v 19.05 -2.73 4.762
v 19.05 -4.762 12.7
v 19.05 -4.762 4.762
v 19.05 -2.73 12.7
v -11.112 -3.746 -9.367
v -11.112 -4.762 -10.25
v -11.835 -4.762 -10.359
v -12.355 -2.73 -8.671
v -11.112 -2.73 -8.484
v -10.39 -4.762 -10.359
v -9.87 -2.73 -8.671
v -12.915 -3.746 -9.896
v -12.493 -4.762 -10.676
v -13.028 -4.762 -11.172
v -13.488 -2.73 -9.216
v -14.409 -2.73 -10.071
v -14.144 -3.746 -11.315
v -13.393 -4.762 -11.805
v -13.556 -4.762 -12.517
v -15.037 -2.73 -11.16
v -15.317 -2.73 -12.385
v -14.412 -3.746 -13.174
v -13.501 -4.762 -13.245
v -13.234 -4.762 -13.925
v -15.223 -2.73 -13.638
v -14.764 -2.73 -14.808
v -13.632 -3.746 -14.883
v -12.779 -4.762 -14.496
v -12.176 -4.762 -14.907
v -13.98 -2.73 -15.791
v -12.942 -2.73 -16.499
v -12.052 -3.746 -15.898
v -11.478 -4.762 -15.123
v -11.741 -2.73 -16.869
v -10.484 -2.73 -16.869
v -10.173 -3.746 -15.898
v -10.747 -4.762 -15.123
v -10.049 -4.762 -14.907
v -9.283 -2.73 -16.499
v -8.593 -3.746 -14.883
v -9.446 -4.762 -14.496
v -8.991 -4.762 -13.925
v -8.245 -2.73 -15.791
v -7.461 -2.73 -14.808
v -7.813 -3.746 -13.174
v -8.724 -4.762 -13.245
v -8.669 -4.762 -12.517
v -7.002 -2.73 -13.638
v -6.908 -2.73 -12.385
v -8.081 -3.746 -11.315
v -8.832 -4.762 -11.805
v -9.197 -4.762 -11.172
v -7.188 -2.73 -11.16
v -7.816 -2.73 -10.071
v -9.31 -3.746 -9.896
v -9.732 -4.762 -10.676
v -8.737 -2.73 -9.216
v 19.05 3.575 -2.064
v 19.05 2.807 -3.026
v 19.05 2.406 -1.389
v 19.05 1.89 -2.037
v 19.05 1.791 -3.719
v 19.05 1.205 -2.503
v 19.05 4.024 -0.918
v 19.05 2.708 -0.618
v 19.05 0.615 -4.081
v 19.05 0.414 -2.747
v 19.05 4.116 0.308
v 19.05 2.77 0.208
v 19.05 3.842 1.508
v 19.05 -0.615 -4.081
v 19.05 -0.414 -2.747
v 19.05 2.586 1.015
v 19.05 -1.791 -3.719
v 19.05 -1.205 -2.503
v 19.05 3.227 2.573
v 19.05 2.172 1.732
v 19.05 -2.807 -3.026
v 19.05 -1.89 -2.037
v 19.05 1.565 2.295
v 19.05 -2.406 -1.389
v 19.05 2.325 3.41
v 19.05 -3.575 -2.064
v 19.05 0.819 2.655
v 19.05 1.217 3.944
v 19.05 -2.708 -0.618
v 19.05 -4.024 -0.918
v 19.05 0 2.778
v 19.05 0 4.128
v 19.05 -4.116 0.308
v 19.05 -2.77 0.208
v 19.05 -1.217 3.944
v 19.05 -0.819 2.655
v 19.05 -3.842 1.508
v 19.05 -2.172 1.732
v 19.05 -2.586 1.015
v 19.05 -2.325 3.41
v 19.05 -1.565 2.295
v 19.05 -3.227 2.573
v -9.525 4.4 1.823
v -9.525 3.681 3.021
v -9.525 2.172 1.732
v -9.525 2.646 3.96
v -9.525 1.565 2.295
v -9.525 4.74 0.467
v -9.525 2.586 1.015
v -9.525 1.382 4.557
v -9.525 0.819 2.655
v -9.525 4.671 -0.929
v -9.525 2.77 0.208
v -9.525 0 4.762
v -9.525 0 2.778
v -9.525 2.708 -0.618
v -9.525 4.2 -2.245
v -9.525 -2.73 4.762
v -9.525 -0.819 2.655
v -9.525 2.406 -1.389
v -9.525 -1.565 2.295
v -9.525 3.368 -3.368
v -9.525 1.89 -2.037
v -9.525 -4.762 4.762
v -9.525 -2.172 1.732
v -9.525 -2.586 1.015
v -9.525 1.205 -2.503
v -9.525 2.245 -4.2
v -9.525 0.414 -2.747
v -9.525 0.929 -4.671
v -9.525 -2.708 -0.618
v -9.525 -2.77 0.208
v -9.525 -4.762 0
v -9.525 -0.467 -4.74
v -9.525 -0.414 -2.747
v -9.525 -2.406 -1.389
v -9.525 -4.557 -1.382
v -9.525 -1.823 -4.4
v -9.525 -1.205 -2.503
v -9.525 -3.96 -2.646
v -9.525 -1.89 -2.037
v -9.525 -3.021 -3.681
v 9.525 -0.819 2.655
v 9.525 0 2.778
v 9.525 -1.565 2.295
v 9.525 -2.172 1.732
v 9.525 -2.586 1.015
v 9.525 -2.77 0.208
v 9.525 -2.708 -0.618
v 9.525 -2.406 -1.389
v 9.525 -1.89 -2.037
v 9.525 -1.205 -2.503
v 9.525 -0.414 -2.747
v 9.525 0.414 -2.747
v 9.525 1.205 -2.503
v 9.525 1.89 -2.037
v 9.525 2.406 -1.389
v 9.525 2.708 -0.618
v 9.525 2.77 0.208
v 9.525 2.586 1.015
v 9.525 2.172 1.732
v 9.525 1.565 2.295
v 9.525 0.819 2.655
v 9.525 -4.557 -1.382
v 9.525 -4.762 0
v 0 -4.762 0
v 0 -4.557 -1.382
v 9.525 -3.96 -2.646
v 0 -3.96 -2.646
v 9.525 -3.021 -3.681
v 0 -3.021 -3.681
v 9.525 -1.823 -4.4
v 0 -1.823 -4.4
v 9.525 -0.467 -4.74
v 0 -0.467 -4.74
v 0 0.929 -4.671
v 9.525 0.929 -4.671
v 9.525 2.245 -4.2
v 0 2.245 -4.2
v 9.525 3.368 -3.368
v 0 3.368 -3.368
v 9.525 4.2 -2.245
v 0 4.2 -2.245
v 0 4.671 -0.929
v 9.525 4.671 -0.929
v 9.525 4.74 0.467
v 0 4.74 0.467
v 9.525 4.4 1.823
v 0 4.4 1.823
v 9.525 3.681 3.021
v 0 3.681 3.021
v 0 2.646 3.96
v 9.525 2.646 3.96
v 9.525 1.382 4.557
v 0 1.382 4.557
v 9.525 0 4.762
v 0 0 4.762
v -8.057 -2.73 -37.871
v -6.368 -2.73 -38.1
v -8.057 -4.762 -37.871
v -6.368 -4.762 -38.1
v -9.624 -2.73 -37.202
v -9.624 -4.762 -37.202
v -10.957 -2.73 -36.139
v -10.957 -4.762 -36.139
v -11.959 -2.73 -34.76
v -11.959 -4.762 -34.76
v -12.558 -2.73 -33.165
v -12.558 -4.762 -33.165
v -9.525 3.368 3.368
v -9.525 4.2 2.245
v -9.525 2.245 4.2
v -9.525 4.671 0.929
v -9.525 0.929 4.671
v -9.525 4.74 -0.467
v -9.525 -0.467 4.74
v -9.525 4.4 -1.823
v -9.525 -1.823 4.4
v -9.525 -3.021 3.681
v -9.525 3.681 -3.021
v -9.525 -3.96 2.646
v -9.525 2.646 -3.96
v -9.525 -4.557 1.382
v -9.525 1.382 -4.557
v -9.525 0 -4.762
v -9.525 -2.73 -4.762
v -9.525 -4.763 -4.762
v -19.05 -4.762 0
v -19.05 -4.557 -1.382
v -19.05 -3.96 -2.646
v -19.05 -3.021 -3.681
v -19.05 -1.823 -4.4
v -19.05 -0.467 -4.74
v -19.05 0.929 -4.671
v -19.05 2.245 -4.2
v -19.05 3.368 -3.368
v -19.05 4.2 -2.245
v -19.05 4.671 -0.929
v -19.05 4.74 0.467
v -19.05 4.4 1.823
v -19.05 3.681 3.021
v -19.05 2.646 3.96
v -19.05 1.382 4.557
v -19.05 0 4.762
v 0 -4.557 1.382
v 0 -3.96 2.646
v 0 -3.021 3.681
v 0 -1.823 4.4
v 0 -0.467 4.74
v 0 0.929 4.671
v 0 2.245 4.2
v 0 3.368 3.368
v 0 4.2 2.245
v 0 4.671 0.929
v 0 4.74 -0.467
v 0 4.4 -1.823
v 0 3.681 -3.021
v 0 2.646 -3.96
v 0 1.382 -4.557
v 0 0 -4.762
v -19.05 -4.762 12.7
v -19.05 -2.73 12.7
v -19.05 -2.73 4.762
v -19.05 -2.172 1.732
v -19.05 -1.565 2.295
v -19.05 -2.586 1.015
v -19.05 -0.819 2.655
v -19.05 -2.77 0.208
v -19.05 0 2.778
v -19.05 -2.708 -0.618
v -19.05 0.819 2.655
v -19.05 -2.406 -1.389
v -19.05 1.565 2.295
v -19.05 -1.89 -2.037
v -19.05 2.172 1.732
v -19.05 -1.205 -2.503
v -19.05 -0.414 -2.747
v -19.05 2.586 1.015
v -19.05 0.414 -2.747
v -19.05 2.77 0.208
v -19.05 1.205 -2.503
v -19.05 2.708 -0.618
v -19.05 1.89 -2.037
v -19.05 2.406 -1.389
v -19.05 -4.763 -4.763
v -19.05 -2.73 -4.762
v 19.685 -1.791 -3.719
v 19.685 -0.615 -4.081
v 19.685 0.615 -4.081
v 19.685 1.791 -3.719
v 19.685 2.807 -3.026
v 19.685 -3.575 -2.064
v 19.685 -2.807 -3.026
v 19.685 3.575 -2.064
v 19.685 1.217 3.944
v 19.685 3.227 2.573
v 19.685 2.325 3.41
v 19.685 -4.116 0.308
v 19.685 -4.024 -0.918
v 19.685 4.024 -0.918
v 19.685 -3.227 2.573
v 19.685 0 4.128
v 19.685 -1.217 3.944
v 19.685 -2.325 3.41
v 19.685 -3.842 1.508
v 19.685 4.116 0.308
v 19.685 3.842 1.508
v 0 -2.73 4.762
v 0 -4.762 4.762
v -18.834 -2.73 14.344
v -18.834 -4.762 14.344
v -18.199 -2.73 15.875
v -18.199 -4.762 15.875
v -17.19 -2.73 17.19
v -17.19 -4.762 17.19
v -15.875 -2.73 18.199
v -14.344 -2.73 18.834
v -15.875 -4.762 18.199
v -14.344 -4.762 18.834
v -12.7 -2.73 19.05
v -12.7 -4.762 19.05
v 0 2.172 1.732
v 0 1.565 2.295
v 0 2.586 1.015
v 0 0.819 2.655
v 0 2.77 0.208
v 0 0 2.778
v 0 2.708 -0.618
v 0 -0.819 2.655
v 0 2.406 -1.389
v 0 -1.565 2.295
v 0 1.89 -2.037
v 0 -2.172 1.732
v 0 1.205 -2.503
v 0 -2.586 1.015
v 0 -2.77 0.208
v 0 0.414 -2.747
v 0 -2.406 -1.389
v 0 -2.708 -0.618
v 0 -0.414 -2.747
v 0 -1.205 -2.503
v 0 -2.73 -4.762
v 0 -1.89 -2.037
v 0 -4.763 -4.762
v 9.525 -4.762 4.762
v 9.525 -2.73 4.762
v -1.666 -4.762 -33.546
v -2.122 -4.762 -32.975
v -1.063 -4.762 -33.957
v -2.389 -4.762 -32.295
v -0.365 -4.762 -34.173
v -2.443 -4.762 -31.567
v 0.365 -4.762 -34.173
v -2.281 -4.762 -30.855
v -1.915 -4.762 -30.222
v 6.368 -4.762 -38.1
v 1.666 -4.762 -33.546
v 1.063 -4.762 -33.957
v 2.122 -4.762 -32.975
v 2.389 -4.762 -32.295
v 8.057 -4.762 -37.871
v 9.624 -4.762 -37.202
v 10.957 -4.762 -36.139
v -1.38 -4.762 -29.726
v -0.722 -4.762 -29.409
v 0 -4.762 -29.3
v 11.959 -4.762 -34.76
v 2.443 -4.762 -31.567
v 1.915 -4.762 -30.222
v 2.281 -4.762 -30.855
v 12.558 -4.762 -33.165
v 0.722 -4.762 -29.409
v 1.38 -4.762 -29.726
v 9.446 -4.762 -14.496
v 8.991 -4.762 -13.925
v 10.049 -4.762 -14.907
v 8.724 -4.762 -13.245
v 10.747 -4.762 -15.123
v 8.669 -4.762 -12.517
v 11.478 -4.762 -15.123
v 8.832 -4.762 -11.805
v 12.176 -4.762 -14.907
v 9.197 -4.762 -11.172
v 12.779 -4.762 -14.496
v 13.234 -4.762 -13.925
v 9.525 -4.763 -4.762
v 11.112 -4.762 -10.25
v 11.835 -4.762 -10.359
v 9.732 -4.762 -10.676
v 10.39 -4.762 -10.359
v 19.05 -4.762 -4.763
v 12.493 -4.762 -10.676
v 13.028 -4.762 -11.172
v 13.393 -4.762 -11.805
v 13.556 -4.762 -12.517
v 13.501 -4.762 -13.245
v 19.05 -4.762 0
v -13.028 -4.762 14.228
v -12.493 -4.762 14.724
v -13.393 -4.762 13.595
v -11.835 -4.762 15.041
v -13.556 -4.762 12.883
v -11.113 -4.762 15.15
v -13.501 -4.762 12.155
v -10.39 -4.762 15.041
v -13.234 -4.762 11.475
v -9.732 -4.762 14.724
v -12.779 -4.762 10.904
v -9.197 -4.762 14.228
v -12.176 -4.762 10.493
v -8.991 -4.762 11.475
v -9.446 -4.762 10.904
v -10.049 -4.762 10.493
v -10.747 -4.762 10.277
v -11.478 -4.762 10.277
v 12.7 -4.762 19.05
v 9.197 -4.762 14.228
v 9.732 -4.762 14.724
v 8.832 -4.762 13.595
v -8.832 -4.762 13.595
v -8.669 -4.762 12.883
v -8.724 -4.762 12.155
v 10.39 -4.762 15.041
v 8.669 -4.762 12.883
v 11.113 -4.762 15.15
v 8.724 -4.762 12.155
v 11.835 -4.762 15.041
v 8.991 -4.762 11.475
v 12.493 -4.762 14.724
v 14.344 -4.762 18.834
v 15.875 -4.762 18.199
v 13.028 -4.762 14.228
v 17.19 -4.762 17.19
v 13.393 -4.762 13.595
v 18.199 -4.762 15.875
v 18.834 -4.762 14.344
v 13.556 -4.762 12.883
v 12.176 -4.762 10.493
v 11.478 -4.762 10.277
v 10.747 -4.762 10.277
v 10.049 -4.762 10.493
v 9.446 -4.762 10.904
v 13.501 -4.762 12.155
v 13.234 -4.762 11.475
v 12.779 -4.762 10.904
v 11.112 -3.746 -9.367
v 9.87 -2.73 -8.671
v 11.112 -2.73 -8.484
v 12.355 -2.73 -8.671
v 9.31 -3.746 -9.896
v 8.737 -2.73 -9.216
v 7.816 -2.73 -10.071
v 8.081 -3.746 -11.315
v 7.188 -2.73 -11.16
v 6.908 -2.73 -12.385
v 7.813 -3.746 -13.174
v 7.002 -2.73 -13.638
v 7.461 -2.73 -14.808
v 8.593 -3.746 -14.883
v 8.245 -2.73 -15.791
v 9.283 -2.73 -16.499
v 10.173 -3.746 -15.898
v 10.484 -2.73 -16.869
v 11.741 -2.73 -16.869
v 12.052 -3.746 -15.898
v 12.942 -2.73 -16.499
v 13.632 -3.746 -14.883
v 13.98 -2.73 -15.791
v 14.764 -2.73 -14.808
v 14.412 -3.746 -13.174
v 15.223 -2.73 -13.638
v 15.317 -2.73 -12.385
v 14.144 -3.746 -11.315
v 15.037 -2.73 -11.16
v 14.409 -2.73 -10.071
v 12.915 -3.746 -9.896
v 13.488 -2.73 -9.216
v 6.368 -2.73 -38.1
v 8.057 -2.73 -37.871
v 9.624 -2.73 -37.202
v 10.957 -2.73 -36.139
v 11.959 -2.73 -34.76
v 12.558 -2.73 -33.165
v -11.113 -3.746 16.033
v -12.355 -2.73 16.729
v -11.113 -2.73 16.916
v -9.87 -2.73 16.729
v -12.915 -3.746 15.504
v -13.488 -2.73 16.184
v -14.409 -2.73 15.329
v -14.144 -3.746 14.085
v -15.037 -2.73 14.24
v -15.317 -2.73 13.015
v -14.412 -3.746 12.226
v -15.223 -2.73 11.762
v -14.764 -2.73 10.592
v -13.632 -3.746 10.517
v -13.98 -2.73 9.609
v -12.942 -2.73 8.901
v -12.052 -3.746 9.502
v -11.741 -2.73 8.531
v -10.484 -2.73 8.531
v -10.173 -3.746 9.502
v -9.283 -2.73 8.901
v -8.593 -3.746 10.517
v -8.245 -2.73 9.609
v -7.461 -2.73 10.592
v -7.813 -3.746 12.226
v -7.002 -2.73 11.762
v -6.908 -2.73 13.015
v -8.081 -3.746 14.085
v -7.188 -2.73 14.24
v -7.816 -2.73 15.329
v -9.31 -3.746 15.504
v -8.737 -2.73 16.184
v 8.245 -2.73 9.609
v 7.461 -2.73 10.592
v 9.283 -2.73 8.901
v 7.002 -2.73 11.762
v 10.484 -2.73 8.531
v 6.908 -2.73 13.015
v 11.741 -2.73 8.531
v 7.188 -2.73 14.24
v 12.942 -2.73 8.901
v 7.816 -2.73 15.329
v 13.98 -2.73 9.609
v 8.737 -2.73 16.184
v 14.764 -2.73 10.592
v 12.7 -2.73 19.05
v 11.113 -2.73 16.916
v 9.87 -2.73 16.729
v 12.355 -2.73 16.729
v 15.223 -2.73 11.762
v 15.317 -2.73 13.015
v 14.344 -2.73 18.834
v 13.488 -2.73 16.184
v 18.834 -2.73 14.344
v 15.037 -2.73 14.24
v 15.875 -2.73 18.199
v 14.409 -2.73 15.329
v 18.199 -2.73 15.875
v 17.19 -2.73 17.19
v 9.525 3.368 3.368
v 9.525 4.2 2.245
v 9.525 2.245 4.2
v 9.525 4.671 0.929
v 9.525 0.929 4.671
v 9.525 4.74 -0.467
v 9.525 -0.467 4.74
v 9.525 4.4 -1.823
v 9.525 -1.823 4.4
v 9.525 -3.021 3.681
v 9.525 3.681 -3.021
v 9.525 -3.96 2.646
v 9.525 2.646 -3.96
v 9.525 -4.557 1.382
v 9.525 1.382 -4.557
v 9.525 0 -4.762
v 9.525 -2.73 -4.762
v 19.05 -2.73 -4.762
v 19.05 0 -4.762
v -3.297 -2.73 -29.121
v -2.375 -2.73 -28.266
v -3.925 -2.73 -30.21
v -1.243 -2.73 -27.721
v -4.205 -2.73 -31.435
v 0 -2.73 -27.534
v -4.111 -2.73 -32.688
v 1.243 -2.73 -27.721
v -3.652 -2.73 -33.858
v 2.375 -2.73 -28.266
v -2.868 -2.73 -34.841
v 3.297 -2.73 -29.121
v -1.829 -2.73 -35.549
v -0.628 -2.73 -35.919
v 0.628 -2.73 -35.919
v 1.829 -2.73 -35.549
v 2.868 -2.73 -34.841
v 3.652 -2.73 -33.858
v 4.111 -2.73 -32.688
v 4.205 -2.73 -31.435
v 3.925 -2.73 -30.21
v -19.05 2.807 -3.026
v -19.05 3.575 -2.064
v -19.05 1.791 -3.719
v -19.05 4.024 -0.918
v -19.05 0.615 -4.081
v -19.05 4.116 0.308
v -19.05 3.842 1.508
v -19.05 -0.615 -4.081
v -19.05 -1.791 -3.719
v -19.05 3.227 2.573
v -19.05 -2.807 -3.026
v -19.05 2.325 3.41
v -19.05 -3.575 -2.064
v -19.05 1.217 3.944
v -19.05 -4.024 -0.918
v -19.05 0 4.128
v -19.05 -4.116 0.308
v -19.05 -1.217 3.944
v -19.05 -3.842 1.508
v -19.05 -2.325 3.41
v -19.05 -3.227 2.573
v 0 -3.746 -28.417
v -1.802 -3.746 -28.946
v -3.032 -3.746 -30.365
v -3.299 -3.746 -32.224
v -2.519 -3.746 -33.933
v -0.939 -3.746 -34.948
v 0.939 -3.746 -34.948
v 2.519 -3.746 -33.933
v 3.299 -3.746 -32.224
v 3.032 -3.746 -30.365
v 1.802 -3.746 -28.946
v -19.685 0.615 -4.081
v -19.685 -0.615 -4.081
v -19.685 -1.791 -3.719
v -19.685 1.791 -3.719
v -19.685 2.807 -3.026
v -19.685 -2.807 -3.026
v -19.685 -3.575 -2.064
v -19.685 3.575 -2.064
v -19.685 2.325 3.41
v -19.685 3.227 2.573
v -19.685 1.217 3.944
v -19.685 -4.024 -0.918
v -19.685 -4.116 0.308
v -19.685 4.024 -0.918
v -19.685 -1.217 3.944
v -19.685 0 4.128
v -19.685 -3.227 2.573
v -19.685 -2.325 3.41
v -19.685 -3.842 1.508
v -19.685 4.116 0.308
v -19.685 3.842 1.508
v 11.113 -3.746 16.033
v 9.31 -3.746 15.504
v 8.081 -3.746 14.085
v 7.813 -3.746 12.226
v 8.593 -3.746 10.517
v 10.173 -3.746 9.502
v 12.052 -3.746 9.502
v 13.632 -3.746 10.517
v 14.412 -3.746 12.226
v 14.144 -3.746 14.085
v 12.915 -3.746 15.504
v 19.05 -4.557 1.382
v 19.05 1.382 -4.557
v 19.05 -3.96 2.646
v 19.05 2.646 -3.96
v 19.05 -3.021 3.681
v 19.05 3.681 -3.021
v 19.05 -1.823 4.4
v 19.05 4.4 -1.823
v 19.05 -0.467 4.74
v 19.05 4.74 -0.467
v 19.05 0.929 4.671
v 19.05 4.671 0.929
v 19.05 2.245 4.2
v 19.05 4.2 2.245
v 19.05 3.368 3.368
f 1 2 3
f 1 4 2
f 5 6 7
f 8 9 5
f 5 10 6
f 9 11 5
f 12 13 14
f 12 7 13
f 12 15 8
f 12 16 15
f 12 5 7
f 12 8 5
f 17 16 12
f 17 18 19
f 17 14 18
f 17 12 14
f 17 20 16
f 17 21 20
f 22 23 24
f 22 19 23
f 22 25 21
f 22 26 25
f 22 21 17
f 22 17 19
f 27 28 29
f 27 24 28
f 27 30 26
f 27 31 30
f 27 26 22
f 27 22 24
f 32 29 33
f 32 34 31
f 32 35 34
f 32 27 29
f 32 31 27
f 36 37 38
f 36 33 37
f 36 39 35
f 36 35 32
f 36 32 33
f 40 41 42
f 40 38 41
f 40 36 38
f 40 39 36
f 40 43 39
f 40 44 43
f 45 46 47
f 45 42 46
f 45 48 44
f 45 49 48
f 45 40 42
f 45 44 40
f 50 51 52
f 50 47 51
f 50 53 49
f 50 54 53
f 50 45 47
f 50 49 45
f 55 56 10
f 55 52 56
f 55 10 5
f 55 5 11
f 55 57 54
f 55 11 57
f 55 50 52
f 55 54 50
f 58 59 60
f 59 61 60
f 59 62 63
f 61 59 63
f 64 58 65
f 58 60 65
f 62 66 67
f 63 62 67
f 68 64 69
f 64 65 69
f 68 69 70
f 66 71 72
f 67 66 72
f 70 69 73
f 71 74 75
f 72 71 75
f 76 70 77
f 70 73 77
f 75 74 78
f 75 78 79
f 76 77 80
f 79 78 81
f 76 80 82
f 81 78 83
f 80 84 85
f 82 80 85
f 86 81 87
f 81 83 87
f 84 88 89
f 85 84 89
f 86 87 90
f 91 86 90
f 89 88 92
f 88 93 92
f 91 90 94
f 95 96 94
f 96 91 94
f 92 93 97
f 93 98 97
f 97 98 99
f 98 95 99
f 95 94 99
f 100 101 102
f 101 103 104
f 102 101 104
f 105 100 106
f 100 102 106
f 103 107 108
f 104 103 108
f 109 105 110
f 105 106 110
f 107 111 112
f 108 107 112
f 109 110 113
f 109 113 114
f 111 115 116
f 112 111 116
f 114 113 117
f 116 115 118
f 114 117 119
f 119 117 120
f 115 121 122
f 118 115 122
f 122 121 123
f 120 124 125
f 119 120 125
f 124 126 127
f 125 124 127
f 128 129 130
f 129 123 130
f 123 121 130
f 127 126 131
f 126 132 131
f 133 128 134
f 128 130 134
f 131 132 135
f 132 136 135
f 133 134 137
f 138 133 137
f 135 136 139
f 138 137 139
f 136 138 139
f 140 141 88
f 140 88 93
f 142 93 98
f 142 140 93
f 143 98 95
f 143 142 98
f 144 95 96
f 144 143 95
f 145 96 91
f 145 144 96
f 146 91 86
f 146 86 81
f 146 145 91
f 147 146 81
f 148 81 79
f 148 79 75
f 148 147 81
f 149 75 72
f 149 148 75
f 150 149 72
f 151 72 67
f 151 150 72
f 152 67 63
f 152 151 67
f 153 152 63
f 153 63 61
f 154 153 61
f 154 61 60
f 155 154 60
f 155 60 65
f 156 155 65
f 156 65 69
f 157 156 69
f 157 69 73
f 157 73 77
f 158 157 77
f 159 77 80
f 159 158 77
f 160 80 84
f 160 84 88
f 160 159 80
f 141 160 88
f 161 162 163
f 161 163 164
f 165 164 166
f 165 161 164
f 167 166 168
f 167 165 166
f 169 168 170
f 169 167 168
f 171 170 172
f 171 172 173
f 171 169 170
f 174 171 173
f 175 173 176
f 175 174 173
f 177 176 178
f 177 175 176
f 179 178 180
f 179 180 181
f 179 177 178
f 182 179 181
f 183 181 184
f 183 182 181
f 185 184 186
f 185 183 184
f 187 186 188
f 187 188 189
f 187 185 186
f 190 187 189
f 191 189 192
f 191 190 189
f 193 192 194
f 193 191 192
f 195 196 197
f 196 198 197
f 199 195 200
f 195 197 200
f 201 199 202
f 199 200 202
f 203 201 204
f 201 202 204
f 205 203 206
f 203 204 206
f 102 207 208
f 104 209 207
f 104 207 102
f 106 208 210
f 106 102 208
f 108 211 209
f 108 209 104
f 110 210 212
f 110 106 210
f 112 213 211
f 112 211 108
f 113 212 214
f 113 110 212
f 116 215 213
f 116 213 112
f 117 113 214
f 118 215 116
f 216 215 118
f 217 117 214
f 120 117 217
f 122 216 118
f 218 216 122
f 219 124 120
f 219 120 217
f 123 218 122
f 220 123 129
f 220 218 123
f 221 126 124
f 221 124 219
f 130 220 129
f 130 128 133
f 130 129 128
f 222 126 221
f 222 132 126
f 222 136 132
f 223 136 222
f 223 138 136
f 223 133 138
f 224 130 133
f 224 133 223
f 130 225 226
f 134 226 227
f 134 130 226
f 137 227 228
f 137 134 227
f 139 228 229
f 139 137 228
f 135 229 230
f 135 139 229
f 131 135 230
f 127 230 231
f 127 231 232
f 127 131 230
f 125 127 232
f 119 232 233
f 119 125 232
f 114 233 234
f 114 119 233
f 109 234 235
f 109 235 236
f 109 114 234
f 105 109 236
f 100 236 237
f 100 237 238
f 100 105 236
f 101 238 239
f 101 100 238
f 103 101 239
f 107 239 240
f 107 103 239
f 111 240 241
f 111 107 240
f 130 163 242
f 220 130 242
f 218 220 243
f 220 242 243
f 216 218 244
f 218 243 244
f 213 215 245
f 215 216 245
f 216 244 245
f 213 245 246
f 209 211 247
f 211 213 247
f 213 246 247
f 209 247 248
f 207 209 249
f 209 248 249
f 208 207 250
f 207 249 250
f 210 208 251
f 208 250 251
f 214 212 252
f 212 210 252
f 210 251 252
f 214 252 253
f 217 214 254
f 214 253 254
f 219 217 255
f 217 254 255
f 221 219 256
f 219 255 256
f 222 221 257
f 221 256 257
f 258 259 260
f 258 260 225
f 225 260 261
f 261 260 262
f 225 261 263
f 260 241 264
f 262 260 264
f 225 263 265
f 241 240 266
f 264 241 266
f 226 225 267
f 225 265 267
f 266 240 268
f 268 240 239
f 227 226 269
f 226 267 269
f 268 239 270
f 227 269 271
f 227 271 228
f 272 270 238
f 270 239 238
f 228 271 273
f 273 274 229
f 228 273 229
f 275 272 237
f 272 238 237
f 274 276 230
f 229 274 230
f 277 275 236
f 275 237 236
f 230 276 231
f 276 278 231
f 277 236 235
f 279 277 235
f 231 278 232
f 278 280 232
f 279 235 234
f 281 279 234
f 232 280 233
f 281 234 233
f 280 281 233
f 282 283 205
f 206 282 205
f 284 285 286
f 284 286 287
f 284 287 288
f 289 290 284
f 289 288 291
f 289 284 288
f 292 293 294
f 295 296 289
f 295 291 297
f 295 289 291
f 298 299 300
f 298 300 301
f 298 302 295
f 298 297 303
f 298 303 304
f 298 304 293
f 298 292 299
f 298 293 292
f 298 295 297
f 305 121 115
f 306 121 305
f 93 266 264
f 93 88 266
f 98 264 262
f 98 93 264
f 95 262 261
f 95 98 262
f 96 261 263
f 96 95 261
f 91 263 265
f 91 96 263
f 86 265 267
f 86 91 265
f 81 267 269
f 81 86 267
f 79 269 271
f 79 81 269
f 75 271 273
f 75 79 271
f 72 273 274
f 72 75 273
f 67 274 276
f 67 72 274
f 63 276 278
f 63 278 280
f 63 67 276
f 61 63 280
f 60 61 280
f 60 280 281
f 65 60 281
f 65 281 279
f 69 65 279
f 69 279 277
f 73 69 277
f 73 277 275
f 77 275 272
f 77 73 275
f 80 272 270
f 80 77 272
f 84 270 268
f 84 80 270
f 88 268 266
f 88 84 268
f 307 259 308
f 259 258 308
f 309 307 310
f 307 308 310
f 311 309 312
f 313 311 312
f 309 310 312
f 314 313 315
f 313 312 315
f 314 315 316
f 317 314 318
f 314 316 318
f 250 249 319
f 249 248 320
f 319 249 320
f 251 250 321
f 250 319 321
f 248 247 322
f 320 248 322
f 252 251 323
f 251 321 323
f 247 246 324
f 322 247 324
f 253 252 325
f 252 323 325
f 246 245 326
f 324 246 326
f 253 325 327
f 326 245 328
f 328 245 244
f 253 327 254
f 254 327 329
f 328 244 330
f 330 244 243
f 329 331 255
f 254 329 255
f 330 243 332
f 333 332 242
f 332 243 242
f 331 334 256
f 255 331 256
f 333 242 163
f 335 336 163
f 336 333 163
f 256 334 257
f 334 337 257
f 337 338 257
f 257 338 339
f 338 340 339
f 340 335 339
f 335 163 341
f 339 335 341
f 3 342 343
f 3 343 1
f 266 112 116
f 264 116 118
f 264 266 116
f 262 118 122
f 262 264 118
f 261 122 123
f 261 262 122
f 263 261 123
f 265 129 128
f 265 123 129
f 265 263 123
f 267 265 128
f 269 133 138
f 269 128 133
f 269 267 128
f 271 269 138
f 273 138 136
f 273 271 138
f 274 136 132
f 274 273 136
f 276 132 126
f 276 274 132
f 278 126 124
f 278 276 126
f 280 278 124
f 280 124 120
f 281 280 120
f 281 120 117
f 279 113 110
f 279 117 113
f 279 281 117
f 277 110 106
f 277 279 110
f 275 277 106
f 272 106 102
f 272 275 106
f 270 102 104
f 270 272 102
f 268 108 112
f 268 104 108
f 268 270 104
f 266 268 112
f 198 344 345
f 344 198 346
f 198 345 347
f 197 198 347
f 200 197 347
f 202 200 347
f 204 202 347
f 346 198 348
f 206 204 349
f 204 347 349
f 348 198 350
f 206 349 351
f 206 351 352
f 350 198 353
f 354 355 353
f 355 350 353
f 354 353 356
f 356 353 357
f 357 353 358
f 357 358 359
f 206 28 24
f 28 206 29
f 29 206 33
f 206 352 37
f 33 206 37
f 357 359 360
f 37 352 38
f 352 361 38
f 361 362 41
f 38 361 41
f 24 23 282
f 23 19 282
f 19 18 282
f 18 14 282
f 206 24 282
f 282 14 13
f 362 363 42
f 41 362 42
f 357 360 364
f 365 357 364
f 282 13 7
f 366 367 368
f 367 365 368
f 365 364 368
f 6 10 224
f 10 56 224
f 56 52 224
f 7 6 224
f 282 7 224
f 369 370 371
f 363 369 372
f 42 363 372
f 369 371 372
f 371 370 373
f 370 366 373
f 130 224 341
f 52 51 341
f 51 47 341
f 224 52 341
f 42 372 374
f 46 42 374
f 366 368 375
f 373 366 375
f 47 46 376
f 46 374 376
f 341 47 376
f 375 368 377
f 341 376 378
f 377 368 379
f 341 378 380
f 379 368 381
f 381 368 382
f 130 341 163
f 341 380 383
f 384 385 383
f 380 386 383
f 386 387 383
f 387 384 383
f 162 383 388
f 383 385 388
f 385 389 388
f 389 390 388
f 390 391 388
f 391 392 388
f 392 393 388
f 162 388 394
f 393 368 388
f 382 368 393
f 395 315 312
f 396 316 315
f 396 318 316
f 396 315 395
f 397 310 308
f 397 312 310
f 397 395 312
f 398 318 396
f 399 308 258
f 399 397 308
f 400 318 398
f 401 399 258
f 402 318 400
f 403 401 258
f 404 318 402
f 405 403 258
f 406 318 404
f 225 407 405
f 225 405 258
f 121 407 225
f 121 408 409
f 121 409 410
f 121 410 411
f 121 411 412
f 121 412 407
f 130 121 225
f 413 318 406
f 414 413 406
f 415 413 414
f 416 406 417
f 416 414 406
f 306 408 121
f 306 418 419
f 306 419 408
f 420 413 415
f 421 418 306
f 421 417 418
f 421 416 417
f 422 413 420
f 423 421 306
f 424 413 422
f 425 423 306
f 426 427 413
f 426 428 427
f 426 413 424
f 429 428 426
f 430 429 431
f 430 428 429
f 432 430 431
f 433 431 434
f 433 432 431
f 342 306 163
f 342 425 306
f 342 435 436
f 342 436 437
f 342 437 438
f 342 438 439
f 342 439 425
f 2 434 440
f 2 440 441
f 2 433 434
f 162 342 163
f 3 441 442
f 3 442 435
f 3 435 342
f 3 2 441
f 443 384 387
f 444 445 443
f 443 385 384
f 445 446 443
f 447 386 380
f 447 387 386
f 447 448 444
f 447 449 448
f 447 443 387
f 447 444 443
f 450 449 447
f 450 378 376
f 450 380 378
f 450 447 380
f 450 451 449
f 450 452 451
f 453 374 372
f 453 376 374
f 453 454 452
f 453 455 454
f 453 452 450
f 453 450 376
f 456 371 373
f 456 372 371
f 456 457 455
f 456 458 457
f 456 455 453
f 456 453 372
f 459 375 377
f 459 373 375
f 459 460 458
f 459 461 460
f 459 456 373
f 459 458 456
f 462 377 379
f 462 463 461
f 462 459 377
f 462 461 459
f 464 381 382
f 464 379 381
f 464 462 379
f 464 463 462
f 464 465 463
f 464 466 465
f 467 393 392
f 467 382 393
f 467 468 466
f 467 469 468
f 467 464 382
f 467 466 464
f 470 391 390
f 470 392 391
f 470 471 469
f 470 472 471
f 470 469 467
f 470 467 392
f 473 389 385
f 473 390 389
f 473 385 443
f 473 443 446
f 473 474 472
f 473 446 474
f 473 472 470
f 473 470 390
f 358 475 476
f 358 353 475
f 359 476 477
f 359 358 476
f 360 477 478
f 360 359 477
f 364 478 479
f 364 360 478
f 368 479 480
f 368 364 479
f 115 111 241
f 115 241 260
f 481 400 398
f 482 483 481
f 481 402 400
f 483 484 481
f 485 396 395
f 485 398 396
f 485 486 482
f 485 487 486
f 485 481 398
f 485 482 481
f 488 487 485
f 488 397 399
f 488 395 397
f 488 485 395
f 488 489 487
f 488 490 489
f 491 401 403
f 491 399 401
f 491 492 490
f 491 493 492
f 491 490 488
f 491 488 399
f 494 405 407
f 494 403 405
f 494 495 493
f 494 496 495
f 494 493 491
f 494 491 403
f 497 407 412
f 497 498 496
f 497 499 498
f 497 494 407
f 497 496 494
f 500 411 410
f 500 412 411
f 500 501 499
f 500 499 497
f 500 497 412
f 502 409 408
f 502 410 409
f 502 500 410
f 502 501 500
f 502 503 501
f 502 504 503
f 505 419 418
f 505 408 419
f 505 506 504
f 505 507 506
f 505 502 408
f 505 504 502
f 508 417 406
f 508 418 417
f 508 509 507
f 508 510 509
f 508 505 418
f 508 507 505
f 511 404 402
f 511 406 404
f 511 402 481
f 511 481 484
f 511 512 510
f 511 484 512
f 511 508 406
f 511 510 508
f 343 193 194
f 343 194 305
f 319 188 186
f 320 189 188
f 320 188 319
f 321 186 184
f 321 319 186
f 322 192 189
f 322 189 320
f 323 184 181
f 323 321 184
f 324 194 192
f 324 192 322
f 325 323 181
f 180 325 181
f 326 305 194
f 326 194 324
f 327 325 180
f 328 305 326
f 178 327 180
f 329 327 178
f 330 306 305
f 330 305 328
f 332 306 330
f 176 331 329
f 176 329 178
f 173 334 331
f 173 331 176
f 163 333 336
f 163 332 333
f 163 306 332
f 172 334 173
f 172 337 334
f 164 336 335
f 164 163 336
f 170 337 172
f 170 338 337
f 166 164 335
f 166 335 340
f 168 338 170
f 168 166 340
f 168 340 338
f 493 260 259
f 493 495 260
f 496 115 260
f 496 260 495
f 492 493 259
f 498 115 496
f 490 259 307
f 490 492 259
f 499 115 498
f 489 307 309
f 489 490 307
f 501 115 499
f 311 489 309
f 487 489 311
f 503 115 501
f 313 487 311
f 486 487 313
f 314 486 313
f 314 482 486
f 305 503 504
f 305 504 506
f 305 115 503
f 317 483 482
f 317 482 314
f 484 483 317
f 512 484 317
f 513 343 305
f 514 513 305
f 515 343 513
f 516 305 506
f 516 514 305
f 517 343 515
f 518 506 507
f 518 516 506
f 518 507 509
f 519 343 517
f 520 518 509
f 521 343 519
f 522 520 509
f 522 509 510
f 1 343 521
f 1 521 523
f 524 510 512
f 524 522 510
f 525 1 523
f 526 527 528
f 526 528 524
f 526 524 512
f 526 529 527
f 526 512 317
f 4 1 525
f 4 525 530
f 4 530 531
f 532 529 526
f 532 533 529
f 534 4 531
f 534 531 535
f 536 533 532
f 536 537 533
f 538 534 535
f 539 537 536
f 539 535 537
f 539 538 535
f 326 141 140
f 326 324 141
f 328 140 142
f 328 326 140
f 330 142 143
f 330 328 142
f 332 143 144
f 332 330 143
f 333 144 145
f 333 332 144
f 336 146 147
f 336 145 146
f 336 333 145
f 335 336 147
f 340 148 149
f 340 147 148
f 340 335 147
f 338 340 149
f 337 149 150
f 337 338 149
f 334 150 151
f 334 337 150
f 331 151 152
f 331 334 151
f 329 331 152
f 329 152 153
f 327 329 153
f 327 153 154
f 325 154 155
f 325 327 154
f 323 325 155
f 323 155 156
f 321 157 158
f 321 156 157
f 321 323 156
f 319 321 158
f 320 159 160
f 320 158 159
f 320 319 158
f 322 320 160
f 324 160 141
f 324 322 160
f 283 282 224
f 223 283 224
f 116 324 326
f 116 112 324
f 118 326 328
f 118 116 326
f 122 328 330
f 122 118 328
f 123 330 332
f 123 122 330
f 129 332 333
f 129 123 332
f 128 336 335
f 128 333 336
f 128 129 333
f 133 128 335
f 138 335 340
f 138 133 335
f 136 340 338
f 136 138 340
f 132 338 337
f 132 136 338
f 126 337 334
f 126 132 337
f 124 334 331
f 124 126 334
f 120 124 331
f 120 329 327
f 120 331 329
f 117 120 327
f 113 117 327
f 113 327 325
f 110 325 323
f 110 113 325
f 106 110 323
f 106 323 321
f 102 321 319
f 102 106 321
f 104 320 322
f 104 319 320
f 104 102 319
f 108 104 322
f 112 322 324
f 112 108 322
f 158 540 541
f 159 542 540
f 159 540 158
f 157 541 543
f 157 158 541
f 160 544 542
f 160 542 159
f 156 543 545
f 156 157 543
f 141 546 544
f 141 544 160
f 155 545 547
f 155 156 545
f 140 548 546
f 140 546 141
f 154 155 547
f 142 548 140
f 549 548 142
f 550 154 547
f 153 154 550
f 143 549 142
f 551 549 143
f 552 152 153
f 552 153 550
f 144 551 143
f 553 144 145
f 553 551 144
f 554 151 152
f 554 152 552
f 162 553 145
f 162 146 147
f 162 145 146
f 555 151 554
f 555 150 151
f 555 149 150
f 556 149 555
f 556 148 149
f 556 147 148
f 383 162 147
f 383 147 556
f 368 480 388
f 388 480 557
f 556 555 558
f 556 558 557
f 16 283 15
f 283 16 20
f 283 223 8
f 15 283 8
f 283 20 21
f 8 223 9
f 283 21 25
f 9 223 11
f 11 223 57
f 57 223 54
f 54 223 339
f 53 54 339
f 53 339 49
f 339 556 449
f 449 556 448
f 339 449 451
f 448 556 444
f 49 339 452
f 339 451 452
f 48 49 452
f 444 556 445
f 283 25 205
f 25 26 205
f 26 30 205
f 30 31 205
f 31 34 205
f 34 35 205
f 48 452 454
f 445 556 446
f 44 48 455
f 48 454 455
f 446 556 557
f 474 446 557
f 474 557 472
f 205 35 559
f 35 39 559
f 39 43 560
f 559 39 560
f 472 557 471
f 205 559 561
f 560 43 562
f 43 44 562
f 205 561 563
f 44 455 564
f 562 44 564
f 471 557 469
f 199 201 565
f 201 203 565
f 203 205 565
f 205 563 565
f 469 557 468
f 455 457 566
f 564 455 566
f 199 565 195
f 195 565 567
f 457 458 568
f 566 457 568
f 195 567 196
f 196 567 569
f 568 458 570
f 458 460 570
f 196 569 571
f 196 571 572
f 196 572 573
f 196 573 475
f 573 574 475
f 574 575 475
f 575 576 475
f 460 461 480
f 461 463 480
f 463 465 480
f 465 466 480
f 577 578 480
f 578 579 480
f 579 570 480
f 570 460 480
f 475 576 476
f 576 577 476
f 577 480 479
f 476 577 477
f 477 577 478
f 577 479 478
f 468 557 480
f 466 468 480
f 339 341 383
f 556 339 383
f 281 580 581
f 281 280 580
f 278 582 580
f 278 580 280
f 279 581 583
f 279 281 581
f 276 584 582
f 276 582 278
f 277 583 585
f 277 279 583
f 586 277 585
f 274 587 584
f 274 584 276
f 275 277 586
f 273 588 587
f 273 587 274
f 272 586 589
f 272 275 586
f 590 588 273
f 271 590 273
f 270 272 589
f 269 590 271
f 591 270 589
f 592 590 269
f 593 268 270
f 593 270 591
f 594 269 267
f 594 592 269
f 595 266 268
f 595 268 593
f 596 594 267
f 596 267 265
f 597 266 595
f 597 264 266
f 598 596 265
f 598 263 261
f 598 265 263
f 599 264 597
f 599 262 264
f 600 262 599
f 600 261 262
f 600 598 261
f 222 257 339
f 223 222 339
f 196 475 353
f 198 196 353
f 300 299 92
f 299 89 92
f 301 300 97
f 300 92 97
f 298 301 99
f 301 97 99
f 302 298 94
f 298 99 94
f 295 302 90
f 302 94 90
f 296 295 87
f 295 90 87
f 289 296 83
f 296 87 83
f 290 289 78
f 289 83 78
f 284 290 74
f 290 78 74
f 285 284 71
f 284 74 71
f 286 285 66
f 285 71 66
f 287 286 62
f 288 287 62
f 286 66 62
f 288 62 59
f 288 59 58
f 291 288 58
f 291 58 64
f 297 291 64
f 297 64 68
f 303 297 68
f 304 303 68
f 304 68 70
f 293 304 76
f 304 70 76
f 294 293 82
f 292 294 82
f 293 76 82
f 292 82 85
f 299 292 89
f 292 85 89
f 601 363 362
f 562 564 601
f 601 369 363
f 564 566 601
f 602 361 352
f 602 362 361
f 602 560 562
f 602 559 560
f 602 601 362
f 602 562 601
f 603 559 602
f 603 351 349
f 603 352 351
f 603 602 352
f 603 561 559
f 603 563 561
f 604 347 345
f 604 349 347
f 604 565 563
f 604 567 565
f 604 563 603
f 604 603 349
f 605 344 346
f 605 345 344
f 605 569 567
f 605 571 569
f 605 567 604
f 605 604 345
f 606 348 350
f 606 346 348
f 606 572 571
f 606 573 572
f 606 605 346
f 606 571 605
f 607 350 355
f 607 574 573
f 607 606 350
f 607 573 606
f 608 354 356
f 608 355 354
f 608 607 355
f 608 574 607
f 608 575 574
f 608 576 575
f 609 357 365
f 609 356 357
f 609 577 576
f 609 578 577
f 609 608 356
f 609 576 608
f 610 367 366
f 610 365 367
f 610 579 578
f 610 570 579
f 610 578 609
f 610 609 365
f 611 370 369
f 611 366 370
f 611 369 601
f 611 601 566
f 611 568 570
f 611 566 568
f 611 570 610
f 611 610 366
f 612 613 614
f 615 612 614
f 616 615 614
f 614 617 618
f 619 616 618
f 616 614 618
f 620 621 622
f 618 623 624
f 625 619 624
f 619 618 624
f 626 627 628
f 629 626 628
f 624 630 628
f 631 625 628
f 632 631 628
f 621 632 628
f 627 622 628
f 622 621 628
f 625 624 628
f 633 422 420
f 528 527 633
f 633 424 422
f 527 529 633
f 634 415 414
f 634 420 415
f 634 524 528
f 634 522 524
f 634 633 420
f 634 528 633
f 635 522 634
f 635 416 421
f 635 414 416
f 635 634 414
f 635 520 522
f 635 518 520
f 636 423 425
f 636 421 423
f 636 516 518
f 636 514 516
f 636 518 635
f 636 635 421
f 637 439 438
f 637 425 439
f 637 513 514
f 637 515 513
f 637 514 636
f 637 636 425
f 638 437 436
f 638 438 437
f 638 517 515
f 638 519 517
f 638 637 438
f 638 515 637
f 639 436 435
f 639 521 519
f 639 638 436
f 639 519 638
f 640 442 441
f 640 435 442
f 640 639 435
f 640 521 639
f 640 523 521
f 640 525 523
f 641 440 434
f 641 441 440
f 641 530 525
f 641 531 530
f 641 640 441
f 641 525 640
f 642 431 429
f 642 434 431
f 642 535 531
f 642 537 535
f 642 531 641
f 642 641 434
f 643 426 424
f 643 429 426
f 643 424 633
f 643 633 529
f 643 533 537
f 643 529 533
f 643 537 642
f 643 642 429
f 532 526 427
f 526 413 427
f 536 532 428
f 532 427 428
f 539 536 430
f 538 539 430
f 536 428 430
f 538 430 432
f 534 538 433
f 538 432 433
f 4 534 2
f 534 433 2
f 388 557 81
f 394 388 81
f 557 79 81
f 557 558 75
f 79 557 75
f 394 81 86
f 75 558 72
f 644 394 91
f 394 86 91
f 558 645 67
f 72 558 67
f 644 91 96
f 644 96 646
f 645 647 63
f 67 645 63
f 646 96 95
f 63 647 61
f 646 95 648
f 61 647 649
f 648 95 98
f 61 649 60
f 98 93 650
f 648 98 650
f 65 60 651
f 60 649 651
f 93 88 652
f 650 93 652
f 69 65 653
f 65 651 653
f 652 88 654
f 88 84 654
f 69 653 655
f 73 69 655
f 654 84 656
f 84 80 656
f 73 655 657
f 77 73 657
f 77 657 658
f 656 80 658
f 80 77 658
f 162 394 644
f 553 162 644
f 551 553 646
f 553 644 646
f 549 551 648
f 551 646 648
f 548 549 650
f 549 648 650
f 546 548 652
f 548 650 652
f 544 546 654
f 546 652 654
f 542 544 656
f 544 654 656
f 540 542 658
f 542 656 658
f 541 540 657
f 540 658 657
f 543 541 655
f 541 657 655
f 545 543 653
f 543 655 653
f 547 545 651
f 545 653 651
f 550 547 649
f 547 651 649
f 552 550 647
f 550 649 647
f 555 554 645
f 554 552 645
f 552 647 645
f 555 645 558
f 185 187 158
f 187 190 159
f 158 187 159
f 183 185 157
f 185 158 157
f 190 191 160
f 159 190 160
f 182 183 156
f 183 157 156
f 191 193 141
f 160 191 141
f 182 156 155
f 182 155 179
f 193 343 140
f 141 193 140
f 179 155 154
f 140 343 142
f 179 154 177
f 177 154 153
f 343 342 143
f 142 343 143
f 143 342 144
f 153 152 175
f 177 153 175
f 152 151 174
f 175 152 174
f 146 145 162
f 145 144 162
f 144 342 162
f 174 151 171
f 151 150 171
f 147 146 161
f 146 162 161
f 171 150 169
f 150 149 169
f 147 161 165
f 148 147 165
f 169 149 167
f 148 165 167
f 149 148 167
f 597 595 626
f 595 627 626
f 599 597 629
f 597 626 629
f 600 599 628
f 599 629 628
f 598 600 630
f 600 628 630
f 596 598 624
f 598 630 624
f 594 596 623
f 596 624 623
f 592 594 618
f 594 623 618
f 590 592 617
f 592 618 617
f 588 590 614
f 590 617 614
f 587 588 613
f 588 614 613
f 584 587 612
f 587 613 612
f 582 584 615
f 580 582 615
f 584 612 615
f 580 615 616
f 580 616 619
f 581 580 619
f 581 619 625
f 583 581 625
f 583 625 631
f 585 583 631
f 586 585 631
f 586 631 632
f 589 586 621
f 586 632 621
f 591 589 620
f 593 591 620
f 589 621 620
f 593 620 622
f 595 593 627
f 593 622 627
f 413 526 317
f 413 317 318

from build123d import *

# Parameters (mm, degrees)
SKETCH1_R                                     = 2.778125
LEFT_LEAF_DEPTH                               = 19.05
CUT_EXTRUDE1_DEPTH                            = 28.358479604
CUT_EXTRUDE1_DEPTH_BACK                       = 28.358479604
SKETCH2_W                                     = 9.525
SKETCH2_H                                     = 9.525
SKETCH3_R                                     = 2.778125
RIGHT_LEAF_DEPTH                              = 19.05
CUT_EXTRUDE2_DEPTH                            = 43.8625
CUT_EXTRUDE2_DEPTH_BACK                       = 43.8625
SKETCH9_W                                     = 9.525
SKETCH9_H                                     = 9.525
SKETCH10_R                                    = 2.778125
EXTRUDE1_DEPTH                                = 19.05
CUT_EXTRUDE3_DEPTH                            = 44.251098818
FILLET1_R                                     = 6.35
FILLET2_R                                     = 6.35
CSK_FOR_8_FLAT_HEAD_MACHINE_SCREW1_AT_2_COUNT = 2
CSK_FOR_8_FLAT_HEAD_MACHINE_SCREW1_AT_2_PITCH = 22.054254833
CSK_FOR_8_FLAT_HEAD_MACHINE_SCREW1_AT_3_COUNT = 2
CSK_FOR_8_FLAT_HEAD_MACHINE_SCREW1_AT_3_PITCH = 22.054254833
CSK_FOR_8_FLAT_HEAD_MACHINE_SCREW1_AT_4_COUNT = 2
CSK_FOR_8_FLAT_HEAD_MACHINE_SCREW1_AT_4_PITCH = 45.818011265
CSK_FOR_8_FLAT_HEAD_MACHINE_SCREW1_AT_5_COUNT = 2
CSK_FOR_8_FLAT_HEAD_MACHINE_SCREW1_AT_5_PITCH = 45.818011265
SKETCH14_W                                    = 0.635
SKETCH14_H                                    = 4.1275


with BuildPart() as part:
    # Sketch1 → Left Leaf (new, symmetric)
    with BuildSketch(Plane(origin=(0, 0, 0), x_dir=(0, 0, -1), z_dir=(1, 0, 0))):
        with BuildLine():
            Line((-4.7625, 0), (-4.7625, -2.7305))
            Line((-4.7625, -2.7305), (-19.05, -2.7305))
            Line((-19.05, -2.7305), (-19.05, -4.7625))
            Line((-19.05, -4.7625), (0, -4.7625))
            ThreePointArc((0, -4.7625), (3.367596045, 3.367596045), (-4.7625, 0))
        make_face()
        with Locations(Location((0, 0, 0), (0, 0, 180))):
            Circle(SKETCH1_R, mode=Mode.SUBTRACT)
    extrude(amount=LEFT_LEAF_DEPTH, both=True)

    # Sketch2 → Cut-Extrude1 (cut, two sides: drawn at the far end of the back side and taken through both)
    with BuildSketch(Plane(origin=(0, 0, 0), x_dir=(1, 0, 0), z_dir=(0, 1, 0)).offset(-CUT_EXTRUDE1_DEPTH_BACK)):
        with Locations((14.2875, 0)):
            Rectangle(SKETCH2_W, SKETCH2_H)
        with Locations((-4.7625, 0)):
            Rectangle(SKETCH2_W, SKETCH2_H)
    extrude(amount=CUT_EXTRUDE1_DEPTH + CUT_EXTRUDE1_DEPTH_BACK, mode=Mode.SUBTRACT)

    # Fillet1
    fillet1_edges = [part.edges().sort_by_distance(p)[0] for p in [
        (19.05, -3.7465, 19.05),
        (-19.05, -3.7465, 19.05),
    ]]
    fillet(fillet1_edges, radius=FILLET1_R)


with BuildPart() as body_2:
    # Sketch3 → Right Leaf (new, symmetric)
    with BuildSketch(Plane(origin=(0, 0, 0), x_dir=(0, 0, -1), z_dir=(1, 0, 0))):
        with BuildLine():
            Line((38.1, -2.7305), (38.1, -4.7625))
            Line((38.1, -4.7625), (0, -4.7625))
            ThreePointArc((0, -4.7625), (-3.367596045, 3.367596045), (4.7625, 0))
            Line((4.7625, 0), (4.7625, -2.7305))
            Line((4.7625, -2.7305), (38.1, -2.7305))
        make_face()
        with Locations(Location((0, 0, 0), (0, 0, 180))):
            Circle(SKETCH3_R, mode=Mode.SUBTRACT)
    extrude(amount=RIGHT_LEAF_DEPTH, both=True)

    # Sketch9 → Cut-Extrude2 (cut, two sides: drawn at the far end of the back side and taken through both)
    with BuildSketch(Plane(origin=(0, 0, 0), x_dir=(1, 0, 0), z_dir=(0, 1, 0)).offset(-CUT_EXTRUDE2_DEPTH_BACK)):
        with Locations((4.7625, 0)):
            Rectangle(SKETCH9_W, SKETCH9_H)
        with Locations((-14.2875, 0)):
            Rectangle(SKETCH9_W, SKETCH9_H)
    extrude(amount=CUT_EXTRUDE2_DEPTH + CUT_EXTRUDE2_DEPTH_BACK, mode=Mode.SUBTRACT)

    # Sketch13 → Cut-Extrude3 (cut, through all)
    with BuildSketch(Plane(origin=(0, -2.7305, 0), x_dir=(-1, 0, 0), z_dir=(0, 1, 0))):
        Polygon((19.05, -4.7625), (11.43, -38.1), (-11.43, -38.1), (-19.05, -4.7625), (-19.05, -46.917728232), (19.05, -46.917728232), align=None)
    extrude(amount=-CUT_EXTRUDE3_DEPTH, mode=Mode.SUBTRACT)

    # Fillet2
    fillet2_edges = [body_2.edges().sort_by_distance(p)[0] for p in [
        (11.43, -3.7465, -38.1),
        (-11.43, -3.7465, -38.1),
    ]]
    fillet(fillet2_edges, radius=FILLET2_R)

    # Sketch12 → CSK for #8 Flat Head Machine Screw1 (revolve, cut)
    with BuildSketch(Plane(origin=(0, -2.7305, -31.75), x_dir=(0, 0, 1), z_dir=(1, 0, 0))):
        Polygon((0, 0), (0, 2.032), (2.2479, 2.032), (2.2479, 2.26450021), (4.2164, 0), align=None)
    csk_for_8_flat_head_machine_screw1 = revolve(axis=Axis((0, 3.6195, -31.75), (0, -1, 0)), mode=Mode.SUBTRACT)

    # CSK for #8 Flat Head Machine Screw1 at 2: CSK for #8 Flat Head Machine Screw1 ×2
    with Locations(*[Vector(-0.5038710255240861, 0, 0.8637789008984336) * (i * CSK_FOR_8_FLAT_HEAD_MACHINE_SCREW1_AT_2_PITCH) for i in range(1, CSK_FOR_8_FLAT_HEAD_MACHINE_SCREW1_AT_2_COUNT)]):
        add(csk_for_8_flat_head_machine_screw1, mode=Mode.SUBTRACT)

    # CSK for #8 Flat Head Machine Screw1 at 3: CSK for #8 Flat Head Machine Screw1 ×2
    with Locations(*[Vector(0.5038710255240861, 0, 0.8637789008984336) * (i * CSK_FOR_8_FLAT_HEAD_MACHINE_SCREW1_AT_3_PITCH) for i in range(1, CSK_FOR_8_FLAT_HEAD_MACHINE_SCREW1_AT_3_COUNT)]):
        add(csk_for_8_flat_head_machine_screw1, mode=Mode.SUBTRACT)


with BuildPart() as body_3:
    # Sketch10 → Extrude1 (new, symmetric)
    with BuildSketch(Plane(origin=(0, 0, 0), x_dir=(0, 0, -1), z_dir=(1, 0, 0))):
        with Locations(Location((0, 0, 0), (0, 0, 180))):
            Circle(SKETCH10_R)
    extrude(amount=EXTRUDE1_DEPTH, both=True)

    # Sketch14 → Revolve1 (revolve)
    with BuildSketch(Plane(origin=(0, 0, 0), x_dir=(-1, 0, 0), z_dir=(0, 1, 0)), mode=Mode.PRIVATE) as revolve1_sk:
        with Locations((-19.3675, -2.06375)):
            Rectangle(SKETCH14_W, SKETCH14_H)
        with Locations((19.3675, -2.06375)):
            Rectangle(SKETCH14_W, SKETCH14_H)
    revolve(revolve1_sk.sketch.rotate(Axis((-19.05, 0, 0), (1, 0, 0)), 180), axis=Axis((-19.05, 0, 0), (1, 0, 0)))


with BuildPart() as part_1:
    add(part.part)

    # CSK for #8 Flat Head Machine Screw1 at 4: CSK for #8 Flat Head Machine Screw1 ×2
    with Locations(*[Vector(-0.242535625036333, 0, 0.970142500145332) * (i * CSK_FOR_8_FLAT_HEAD_MACHINE_SCREW1_AT_4_PITCH) for i in range(1, CSK_FOR_8_FLAT_HEAD_MACHINE_SCREW1_AT_4_COUNT)]):
        add(csk_for_8_flat_head_machine_screw1, mode=Mode.SUBTRACT)

    # CSK for #8 Flat Head Machine Screw1 at 5: CSK for #8 Flat Head Machine Screw1 ×2
    with Locations(*[Vector(0.242535625036333, 0, 0.970142500145332) * (i * CSK_FOR_8_FLAT_HEAD_MACHINE_SCREW1_AT_5_PITCH) for i in range(1, CSK_FOR_8_FLAT_HEAD_MACHINE_SCREW1_AT_5_COUNT)]):
        add(csk_for_8_flat_head_machine_screw1, mode=Mode.SUBTRACT)


solid = Compound([body_2.part, body_3.part, part_1.part])
